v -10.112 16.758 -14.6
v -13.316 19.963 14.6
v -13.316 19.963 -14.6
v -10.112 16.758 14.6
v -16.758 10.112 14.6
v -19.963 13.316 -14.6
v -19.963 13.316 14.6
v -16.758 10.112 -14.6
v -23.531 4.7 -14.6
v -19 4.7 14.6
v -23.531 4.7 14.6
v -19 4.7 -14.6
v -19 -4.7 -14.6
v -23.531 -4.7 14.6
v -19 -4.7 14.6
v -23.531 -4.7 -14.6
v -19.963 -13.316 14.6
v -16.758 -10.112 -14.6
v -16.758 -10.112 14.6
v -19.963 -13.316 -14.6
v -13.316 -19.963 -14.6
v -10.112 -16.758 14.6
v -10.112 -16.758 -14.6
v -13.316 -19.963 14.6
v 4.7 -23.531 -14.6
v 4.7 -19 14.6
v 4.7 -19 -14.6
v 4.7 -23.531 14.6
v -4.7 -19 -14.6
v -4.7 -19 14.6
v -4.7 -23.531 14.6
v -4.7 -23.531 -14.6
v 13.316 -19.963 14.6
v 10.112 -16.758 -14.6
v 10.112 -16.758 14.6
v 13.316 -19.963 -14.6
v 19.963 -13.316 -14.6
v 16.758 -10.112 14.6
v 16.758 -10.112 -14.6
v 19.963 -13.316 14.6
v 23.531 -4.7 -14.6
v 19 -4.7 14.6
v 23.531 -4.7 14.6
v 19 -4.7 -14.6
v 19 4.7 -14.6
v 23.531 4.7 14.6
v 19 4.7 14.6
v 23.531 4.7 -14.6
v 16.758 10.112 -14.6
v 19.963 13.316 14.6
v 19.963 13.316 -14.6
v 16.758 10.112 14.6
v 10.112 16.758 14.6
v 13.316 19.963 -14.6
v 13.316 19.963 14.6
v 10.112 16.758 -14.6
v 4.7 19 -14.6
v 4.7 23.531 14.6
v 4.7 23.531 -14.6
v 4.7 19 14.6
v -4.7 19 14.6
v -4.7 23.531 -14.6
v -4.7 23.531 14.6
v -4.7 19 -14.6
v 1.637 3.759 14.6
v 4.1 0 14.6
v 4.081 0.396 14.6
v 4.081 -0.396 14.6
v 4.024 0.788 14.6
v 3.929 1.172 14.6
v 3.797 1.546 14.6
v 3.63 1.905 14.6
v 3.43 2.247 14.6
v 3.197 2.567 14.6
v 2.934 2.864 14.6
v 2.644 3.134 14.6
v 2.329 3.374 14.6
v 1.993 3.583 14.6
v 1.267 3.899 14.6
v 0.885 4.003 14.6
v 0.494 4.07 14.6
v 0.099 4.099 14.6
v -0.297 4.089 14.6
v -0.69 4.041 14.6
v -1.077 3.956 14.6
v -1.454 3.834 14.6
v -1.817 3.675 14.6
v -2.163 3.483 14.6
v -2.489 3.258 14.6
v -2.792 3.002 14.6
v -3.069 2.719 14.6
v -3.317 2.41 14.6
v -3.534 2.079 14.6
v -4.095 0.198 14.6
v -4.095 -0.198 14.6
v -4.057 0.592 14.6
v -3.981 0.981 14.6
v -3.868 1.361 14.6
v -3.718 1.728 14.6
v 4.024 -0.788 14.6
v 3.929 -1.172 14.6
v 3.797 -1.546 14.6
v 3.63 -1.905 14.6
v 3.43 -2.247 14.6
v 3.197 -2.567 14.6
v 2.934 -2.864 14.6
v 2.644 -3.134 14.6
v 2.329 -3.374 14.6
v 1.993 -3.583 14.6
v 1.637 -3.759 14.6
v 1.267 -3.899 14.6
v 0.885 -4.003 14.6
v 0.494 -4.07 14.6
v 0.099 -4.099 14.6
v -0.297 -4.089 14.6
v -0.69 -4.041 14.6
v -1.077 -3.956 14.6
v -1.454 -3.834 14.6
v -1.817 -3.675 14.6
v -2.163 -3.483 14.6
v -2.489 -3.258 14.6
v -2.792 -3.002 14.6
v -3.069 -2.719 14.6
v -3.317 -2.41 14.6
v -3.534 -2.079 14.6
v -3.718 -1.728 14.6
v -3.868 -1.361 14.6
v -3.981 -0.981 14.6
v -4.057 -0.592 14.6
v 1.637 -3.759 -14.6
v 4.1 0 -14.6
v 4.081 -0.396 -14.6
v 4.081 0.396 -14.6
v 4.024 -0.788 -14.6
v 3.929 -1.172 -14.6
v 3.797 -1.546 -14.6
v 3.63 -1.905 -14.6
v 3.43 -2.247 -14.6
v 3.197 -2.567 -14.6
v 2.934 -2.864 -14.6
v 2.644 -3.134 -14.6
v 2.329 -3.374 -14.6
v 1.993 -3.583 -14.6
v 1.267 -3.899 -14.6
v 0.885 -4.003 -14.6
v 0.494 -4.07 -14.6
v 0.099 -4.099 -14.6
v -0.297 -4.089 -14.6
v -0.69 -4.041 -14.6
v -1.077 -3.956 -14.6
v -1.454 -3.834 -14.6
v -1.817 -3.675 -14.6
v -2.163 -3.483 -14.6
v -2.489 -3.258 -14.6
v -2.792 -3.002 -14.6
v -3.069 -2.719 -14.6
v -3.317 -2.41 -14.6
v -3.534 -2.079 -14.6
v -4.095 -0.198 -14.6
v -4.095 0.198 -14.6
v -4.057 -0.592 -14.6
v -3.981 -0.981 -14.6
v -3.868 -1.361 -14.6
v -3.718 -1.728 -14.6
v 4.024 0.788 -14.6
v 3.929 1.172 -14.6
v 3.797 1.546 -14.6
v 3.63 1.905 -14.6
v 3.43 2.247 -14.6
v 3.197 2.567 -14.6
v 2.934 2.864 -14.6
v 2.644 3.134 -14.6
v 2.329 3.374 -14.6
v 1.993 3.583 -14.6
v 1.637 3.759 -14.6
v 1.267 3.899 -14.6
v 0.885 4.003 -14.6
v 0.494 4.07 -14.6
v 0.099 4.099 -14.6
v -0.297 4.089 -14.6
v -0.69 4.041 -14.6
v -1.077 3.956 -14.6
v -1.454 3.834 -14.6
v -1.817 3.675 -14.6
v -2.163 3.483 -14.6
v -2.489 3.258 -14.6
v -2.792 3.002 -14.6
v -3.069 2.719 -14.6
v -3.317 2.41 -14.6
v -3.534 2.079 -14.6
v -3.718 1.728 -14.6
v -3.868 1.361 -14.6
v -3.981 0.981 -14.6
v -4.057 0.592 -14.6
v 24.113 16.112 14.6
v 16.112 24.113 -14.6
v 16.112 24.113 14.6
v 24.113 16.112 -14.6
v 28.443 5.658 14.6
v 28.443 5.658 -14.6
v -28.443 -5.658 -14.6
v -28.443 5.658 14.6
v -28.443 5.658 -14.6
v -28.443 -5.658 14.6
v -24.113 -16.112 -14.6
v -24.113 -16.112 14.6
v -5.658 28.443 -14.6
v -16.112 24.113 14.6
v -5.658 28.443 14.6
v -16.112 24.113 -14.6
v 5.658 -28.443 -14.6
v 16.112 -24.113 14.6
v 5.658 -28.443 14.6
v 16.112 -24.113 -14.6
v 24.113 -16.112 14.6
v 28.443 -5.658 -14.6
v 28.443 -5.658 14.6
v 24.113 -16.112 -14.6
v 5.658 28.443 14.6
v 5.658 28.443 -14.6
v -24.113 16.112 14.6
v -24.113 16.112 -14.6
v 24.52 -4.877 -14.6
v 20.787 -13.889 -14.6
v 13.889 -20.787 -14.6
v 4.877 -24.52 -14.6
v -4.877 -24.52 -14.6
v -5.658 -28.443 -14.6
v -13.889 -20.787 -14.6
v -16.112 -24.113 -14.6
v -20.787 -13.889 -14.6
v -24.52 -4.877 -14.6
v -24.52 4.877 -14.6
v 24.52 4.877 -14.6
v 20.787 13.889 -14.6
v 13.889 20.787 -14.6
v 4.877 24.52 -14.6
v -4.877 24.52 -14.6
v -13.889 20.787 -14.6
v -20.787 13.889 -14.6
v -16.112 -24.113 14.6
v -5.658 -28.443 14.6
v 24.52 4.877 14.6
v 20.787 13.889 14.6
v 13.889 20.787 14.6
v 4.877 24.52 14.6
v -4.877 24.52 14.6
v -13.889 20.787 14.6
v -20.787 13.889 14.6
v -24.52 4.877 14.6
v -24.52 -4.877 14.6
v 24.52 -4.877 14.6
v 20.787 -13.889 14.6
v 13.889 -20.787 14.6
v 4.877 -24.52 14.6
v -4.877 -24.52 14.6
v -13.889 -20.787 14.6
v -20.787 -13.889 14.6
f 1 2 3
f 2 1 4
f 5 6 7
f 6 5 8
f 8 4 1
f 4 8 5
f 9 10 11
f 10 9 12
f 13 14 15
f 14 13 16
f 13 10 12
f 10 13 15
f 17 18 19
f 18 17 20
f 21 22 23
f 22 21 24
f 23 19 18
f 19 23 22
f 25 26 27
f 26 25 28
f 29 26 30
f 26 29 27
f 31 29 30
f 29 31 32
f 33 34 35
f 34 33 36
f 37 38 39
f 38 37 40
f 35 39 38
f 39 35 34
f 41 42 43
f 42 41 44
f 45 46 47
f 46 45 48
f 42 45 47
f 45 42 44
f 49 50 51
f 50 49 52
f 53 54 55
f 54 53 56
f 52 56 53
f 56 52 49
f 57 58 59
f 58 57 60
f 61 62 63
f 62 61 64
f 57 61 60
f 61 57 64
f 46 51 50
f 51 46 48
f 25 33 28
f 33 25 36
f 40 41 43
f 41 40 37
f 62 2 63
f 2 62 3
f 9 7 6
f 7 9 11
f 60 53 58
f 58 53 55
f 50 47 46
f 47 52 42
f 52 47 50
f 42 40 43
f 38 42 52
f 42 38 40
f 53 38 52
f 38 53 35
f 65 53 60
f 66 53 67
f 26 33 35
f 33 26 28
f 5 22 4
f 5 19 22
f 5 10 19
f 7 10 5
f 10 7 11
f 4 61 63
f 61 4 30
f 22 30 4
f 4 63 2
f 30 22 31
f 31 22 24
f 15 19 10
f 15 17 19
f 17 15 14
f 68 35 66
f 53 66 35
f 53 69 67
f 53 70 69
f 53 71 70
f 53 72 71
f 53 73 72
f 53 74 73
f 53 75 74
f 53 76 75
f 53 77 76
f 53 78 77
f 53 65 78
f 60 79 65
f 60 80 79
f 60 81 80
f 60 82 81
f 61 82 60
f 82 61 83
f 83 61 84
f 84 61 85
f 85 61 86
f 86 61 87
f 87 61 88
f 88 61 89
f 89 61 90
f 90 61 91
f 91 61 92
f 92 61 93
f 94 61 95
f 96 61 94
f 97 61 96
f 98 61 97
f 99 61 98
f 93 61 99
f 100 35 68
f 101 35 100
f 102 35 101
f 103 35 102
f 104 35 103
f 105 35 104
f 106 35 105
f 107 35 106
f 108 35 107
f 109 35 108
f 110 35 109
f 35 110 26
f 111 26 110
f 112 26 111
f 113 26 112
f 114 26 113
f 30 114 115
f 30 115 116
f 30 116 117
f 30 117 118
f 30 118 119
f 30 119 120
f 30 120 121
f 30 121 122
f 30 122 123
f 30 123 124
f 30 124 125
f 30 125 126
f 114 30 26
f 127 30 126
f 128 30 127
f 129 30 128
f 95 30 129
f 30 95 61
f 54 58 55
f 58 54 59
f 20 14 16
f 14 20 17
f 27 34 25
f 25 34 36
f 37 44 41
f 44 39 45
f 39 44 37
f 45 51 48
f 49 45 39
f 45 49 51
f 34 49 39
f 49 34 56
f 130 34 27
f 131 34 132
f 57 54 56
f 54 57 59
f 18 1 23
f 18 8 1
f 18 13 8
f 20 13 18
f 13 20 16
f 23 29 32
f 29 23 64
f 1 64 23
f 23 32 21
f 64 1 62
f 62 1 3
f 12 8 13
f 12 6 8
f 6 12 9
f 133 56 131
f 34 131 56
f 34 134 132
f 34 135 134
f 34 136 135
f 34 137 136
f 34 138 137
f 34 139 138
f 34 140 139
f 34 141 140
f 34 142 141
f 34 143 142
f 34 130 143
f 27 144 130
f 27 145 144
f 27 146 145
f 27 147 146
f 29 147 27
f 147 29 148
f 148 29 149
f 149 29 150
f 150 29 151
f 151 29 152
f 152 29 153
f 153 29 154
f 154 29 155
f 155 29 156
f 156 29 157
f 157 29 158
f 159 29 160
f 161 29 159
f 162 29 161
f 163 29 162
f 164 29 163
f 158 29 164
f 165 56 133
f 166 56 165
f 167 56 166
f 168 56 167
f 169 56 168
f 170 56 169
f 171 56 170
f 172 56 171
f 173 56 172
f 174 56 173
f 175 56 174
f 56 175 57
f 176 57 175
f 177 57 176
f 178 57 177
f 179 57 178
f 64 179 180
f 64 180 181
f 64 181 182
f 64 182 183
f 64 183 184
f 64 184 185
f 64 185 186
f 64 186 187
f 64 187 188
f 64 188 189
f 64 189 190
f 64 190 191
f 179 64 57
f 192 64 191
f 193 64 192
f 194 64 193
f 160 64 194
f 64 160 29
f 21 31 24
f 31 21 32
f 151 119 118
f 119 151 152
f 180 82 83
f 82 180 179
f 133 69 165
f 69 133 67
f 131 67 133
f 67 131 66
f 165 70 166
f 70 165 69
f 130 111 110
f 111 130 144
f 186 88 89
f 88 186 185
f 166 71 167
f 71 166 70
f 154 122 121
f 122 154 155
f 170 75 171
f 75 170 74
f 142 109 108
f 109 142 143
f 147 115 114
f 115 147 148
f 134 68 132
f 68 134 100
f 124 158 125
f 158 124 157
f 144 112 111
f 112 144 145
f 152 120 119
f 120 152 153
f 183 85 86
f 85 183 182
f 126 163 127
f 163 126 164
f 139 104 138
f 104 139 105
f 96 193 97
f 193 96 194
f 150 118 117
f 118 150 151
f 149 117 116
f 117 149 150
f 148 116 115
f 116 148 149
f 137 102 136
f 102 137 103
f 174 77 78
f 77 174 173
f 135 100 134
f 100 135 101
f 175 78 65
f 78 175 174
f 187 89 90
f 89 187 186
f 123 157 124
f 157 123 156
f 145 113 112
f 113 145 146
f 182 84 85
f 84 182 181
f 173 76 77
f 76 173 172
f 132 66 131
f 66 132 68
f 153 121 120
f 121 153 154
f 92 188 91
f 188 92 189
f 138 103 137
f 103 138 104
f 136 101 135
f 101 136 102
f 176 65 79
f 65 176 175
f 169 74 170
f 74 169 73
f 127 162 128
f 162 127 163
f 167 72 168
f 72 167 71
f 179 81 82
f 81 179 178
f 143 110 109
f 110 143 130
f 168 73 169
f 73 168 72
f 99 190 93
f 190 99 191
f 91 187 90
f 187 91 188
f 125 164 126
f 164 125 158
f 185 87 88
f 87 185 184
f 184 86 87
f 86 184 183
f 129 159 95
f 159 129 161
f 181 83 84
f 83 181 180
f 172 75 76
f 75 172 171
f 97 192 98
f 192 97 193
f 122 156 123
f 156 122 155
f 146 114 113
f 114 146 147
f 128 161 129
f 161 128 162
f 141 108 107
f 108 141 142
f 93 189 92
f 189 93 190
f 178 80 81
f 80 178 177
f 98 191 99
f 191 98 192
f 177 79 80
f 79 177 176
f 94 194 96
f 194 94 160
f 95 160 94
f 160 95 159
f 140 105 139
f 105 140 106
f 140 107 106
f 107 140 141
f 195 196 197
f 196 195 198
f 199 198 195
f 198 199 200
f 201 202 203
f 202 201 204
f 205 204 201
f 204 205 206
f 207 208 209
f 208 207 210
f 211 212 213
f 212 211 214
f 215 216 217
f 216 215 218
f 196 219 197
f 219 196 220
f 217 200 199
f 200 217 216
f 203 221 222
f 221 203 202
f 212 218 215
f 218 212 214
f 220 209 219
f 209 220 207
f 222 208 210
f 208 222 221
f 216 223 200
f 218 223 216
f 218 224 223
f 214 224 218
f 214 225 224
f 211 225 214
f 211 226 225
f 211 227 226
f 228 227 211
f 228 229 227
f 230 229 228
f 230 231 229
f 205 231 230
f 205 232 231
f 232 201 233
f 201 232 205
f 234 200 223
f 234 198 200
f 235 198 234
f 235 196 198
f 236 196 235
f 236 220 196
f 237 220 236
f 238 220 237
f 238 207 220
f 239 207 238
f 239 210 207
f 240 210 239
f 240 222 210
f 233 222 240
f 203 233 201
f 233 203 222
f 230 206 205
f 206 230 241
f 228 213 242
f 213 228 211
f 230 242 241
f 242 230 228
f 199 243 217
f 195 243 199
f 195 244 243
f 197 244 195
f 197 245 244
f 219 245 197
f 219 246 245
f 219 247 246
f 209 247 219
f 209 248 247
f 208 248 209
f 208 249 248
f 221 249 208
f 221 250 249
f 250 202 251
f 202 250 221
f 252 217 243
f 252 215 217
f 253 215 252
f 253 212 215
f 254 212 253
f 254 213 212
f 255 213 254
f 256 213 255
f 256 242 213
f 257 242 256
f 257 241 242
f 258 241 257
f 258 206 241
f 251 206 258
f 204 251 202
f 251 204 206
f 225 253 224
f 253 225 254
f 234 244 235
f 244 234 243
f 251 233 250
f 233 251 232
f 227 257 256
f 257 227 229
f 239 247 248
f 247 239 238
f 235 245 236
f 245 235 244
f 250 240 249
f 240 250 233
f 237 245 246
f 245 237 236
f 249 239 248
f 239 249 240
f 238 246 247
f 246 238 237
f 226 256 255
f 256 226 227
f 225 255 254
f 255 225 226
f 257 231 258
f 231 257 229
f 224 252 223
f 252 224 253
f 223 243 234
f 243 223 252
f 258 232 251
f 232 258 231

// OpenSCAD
include <MCAD/bearing.scad>

// ---------------------------
// Constants
// ---------------------------
$fa = 1;
$fs = 0.4;
in_to_mm = 25.4;
gap = 1.25; //1/32 * in_to_mm;
nut_gap = 7;//3/4 * in_to_mm;
eps = .15;

bearingModel = 608; //608
bearing_depth = bearingWidth(bearingModel);
bearing_or = bearingOuterDiameter(bearingModel)/2;
bearing_ir = bearingInnerDiameter(bearingModel)/2;
axel_ir = bearing_ir+.1;
alignment_bolt_r = 3.9/2;


// ---------------------------
// Variables
// ---------------------------
num_holes=8;
sectors = num_holes;
sector_degrees = 360 / sectors;

// Bar Magent values
bar_mag_length = 29.2;//29.2;
bar_mag_width = 9.4;//9.4;
bar_mag_depth = 5;//5;
border = 5;

// Coil related values
coil_wire_width = bar_mag_width;
coil_inner_r = 1;
coil_center_hole_r = bearing_or+eps;

// Calculated values
bar_mag_cir = num_holes*2*bar_mag_width;
//bar_mag_disk_r = round(bar_mag_cir/(3.14159*2)+bar_mag_length+border+2);
bar_mag_disk_r = round(bar_mag_cir/(3.14159*2));
bar_mag_disk_depth = bar_mag_depth;
coil_disk_depth = 4;
coil_disk_r = round(bar_mag_disk_r + coil_disk_depth + gap);
coil_disk_base = .6;

//Print values
echo(str("num_holes:", num_holes));
echo(str("bearing_depth:", bearing_depth));
echo(str("sector_degrees:", sector_degrees));
echo(str("bar_mag_disk_r:", bar_mag_disk_r));
echo(str("bar_mag_disk_depth:", bar_mag_disk_depth));
echo(str("coil_disk_r:", coil_disk_r));
echo(str("coil_disk_depth:", coil_disk_depth));

//#translate([0,0,6.6])barMagCoilHolderBottom();
//%translate([0,0,0])barMagCoilHolderInnerAnchorArray();

//cylinder(h=bar_mag_length,r=bar_mag_disk_r,center=true);//,$fn=num_holes*2);
//rotate([0,0,sector_degrees/4])
//barMagVertCyl(rounded=false);
rotate([0,0,0]) { //sector_degrees/4
    %barMagVertArray();
    barMagVertDisk(rounded=false);
}
coilVertDisk(rounded=false);

module coilVertDisk(h=bar_mag_length, r=coil_disk_r, rounded=true) {
    difference() {
        barMagVertCyl(h=h,r=r,rounded=rounded);
        barMagVertCyl(h=h+1,r=r-coil_disk_depth,rounded=rounded);
    }
}

module barMagVertDisk(rounded=true) {
    z=bar_mag_length+1;
    difference() {
        barMagVertCyl(rounded=rounded);
        barMagVertArray(y=bar_mag_depth,z=z);
        barMagVertCyl(h=z, r=axel_ir);
    }
}

module barMagVertCyl(h=bar_mag_length, r=bar_mag_disk_r, rounded=true) {
    if (rounded == true) {
        cylinder(h=h,r=r,center=true);
    } else {
        rotate([0,0,sector_degrees/4])
        cylinder(h=h,r=r,center=true, $fn=num_holes*2);
    }
}

module barMagVertArray(x=bar_mag_width, y=bar_mag_depth, z=bar_mag_length) {
    sectors = num_holes;
    sector_degrees = 360 / sectors;
    for(sector = [1 : sectors]) {
        angle = sector_degrees * sector;
        rotate([0,0,angle])barMagVert(x=x, y=y, z=z);
    }    
}

module barMagVert(x=bar_mag_width, y=bar_mag_depth, z=bar_mag_length) {
    //-.45
    translate([0,bar_mag_disk_r-(y/2),0])
    cube([x,y,z], center=true);
}

render_mode = "JOE"; //"FULL", "PRINT", "TEST";
print_mode = "MAG_DISK"; //"MAG_DISK","COIL_DISK","HOLDER_TOP","HOLDER_BOT";

// Main rendering code
if (render_mode=="FULL") {
    renderFull();
} else if (render_mode=="PRINT") {
    renderPrint();
} else if (render_mode=="TEST") {
    renderTest();
}

module renderFull() {
    // Coil Disk
    //#barMagCoilHolderArray();
    barMagCoilDisk(bearing=true);
    
    // Rotating Magnet Disks (animate use: fps=1, steps=12)
    z_offset = (bar_mag_disk_depth + bearing_depth)/2 +1;
    rotate([0,0,sector_degrees*$t]) {
        translate([0,0,z_offset])
        %barMagDisk();
        translate([0,0,-z_offset])
        %barMagDisk();
    }
}

module renderPrint() {
    if (print_mode=="MAG_DISK") {
        // Magnet Disk1
        barMagDisk();
    } else if (print_mode=="COIL_DISK") {
        // COIL Disk
        barMagCoilDisk();
    } else if (print_mode=="HOLDER_TOP") {
        // Wire coil holder top and cap
        // Only need one set of these for winding the coils
        barMagCoilHolderTop();
        rotate([0,0,90])barMagCoilHolderCap();
    } else if (print_mode=="HOLDER_BOT") {
        // Wire coil holder bottom
        barMagCoilHolderBottom();
    }
}

// ---------------------------------------
// Rotating Bar Magnet Disk Modules
// ---------------------------------------

// Bar Magnet Disk
module barMagDisk(h=bar_mag_depth) {
    difference() {
        cylinder(h=h,r=bar_mag_disk_r,center=true);
        //remove holes for bar magnets
        barMagHoles(bar_mag_disk_r, border);
        //remove hole for main axel
        cylinder(h=h*2,r=axel_ir,center=true);
    }
}

module barMagHoles(r,b,x=bar_mag_length,y=bar_mag_width,z=20) {
    sectors = num_holes;
    sector_degrees = 360 / sectors;
    for(sector = [1 : sectors]) {
        angle = sector_degrees * sector;
        rotate([0,0,angle])barMagHole(r,b,x,y,z);
    }    
}

module barMagHole(r,b,x=bar_mag_length,y=bar_mag_width,z=20) {
    translate([r-(x/2)-b,0,0])cube([x, y, z], center=true);
}

// ---------------------------------------
// Stationary Coil Disk Modules
// ---------------------------------------

// Stationary Bar Mag Coil Disk with trapezoid coils
module barMagCoilDisk(h=coil_disk_depth, bearing=false) {
    anchor_z = 2+coil_disk_base;
    anchor_offest_z = (h-anchor_z)/2;
    hole_or = bar_mag_disk_r + (coil_disk_r-bar_mag_disk_r)/1.5;
    // Disk
    difference() {
        //main structure
        cylinder(h=h,r=coil_disk_r,center=true);
        //remove trapezoids for coils
        translate([0,0,coil_disk_base])barMagCoilHolderOuterArray(z=h);
        //translate([0,0,coil_disk_base])barMagCoilHolderArray(z=h);
        // remove center hole for bearing
        cylinder(h=h*2,r=coil_center_hole_r,center=true);
        // remove outer alignment holes
        structureHoles(h=h,radius=hole_or,hole_r=alignment_bolt_r,sectors=num_holes*2);
        // remove wire channels
        wireChannels(h=h,radius=hole_or,hole_r=alignment_bolt_r,sectors=num_holes);
    }
    translate([0,0,-anchor_offest_z])barMagCoilHolderInnerAnchorArray(z=anchor_z);
    if (bearing == true) {
        translate([0, 0, -bearing_depth/2])
        bearing(model=bearingModel, outline=false);
    }
}


// ---------------------------------------
// Coil Holder Modules
// ---------------------------------------

module barMagCoilHolderCap(z=2) {
    difference() {
        barMagCoilHolderOuterHull(y=coil_wire_width,z=z);
        barMagCoilHolderCenterHoles();
    }
}

module barMagCoilHolderTop(z=2) {
    z_anch = 4;
    difference() {
        union() {
            barMagCoilHolderOuterHull(y=coil_wire_width,z=z);
            translate([0,0,z/2])rotate([0,0,180])barMagCoilHolderInnerAnchor(z=z_anch);
        }
        barMagCoilHolderCenterHoles();
    }
}

module barMagCoilHolderBottom(z=coil_disk_depth) {
    z_off1 = coil_disk_base;
    z_off2 = (z_off1+.0)*2;
    difference() {
        barMagCoilHolderOuterHull(y=coil_wire_width-.45,z=z);
        // remove space for wire
        translate([0,0,z_off1])barMagCoilHolderDiff(z=z);
        // chop off the top to make it the right overall depth
        translate([0,0,z/2])barMagCoilHolderOuterHull(y=coil_wire_width,z=z_off2);
        // remove bolt holes used for winding
        barMagCoilHolderCenterHoles();
        // remove wire start/finish holes
        barMagCoilHolderWireHoles();
        // remove anchor inset
        rotate([0,0,180])translate([0,0,z/2-z_off1])barMagCoilHolderInnerAnchor(z=5, scaleFactor=.81);
    }
}

module barMagCoilHolderCenterHoles(z=coil_disk_depth) {
    coil_center_r = coil_disk_r - border - coil_wire_width - bar_mag_length/1.5;
    coil_offset_r = coil_center_r + coil_wire_width;
    rotate([0,0,-sector_degrees/2]) {
        translate([0,coil_center_r,0])cylinder(h=z*2,r=alignment_bolt_r,center=true);
        translate([0,coil_offset_r,0])cylinder(h=z*2,r=1.5,center=true);
    }
}

module barMagCoilHolderWireHoles(z=coil_disk_depth) {
    x_off = coil_wire_width/8;
    coil_offset_r = coil_disk_r - border - coil_wire_width/1.25;
    translate([x_off,coil_offset_r,0])cylinder(h=z*2,r=1,center=true);
    rotate([0,0,-sector_degrees]) {
        translate([-x_off,coil_offset_r,0])cylinder(h=z*2,r=1,center=true);
    }
}

module barMagCoilHolderArray(z=10) {
    sectors = num_holes/2;
    sector_degrees = 360 / sectors;
    for(sector = [1 : sectors]) {
        angle = sector_degrees * sector;
        rotate([0,0,angle])barMagCoilHolderDiff(z=z);
    }    
}

module barMagCoilHolderDiff(z=10) {
    difference() {
        barMagCoilHolderOuterHull(z=z);
        barMagCoilHolderInnerHull(z=z+2);
    }
}

module barMagCoilHolderOuterArray(z=20) {
    sectors = num_holes/2;
    sector_degrees = 360 / sectors;
    for(sector = [1 : sectors]) {
        angle = sector_degrees * sector;
        //echo(str("angle_h:", angle));
        rotate([0,0,angle])barMagCoilHolderOuterHull(z=z);
    }    
}

module barMagCoilHolderOuterHull(y=coil_wire_width,z=10) {
    hull() {
        barMagCoilOutlines(r=bar_mag_disk_r,b=border,y=y,z=z);
    }
}
module barMagCoilOutlines(r,b,x=bar_mag_length,y=coil_wire_width,z=10) {
    sectors = num_holes;
    sector_degrees = 360 / sectors;
    for(sector = [1 : 0.25 : 2]) {
        angle = sector_degrees * sector;
        rotate([0,0,angle])barMagCoilOut(r,b,sector,x,y,z);
    }    
}

module barMagCoilOut(r,b,sector,x=bar_mag_length,y=coil_wire_width,z=10) {
    x_off = x/2 + y/2 + coil_inner_r;
    x_off2 = x_off/1.25;
    y_off = y/4;
    translate([r-(x/2)-b,0,0]){
        if (sector == 1) {
            translate([x_off,y_off,0])cylinder(h=z,r=y/2,center=true);
            translate([x_off2,0,0])cylinder(h=z,r=y/2,center=true);
            translate([-x_off2,0,0])cylinder(h=z,r=y/2,center=true);
            translate([-x_off,y_off,0])cylinder(h=z,r=y/2,center=true);
        } else if (sector == 2) {
            translate([x_off,-y_off,0])cylinder(h=z,r=y/2,center=true);
            translate([x_off2,0,0])cylinder(h=z,r=y/2,center=true);
            translate([-x_off2,0,0])cylinder(h=z,r=y/2,center=true);
            translate([-x_off,-y_off,0])cylinder(h=z,r=y/2,center=true);
        } else {
            translate([x_off,-y_off,0])cylinder(h=z,r=y/2,center=true);
        }
    }
}

module barMagCoilHolderInnerAnchorArray(z=2, scaleFactor=0.8) {
    sectors = num_holes/2;
    sector_degrees = 360 / sectors;
    for(sector = [1 : sectors]) {
        angle = (sector_degrees * sector)-(180-sector_degrees);// + (sector_degrees * 1.2); //For 10
        //echo(str("angle_a:", angle));
        rotate([0,0,angle])barMagCoilHolderInnerAnchor(z=z,scaleFactor=scaleFactor);
    }    
}

module barMagCoilHolderInnerAnchor(z=4, scaleFactor=0.8) {
    y_off = bar_mag_disk_r-(bar_mag_length/2)-border;
    angle = 90 + (sector_degrees * 1.5); //-sector_degrees/2
    rotate([0,0,angle])
    translate([0,y_off,0])
    scale([scaleFactor,scaleFactor,1])barMagCoilHolderInnerHullCenter(z=z);
}

//translate([-16,-39,0])barMagCoilHolderInnerHull(z=5);
module barMagCoilHolderInnerHullCenter(z=20) {
    angle = 90 - (sector_degrees * 1.5);
    y_off = bar_mag_disk_r-(bar_mag_length/2)-border;
    translate([0,-y_off,0])
    rotate([0,0,angle])
    barMagCoilHolderInnerHull(z=z);
}

module barMagCoilHolderInnerHull(z=20) {
    hull() {
        barMagCoilInlines(bar_mag_disk_r,border,z=z);
    }
}

module barMagCoilInlines(r,b,x=bar_mag_length,y=coil_wire_width,z=20) {
    sectors = num_holes;
    sector_degrees = 360/sectors;
    for(sector = [1 : 0.5 : 2]) {
        angle = sector_degrees * sector;
        rotate([0,0,angle])barMagCoilIn(r,b,sector,x,y,z);
    }    
}

module barMagCoilIn(r,b,sector,x=bar_mag_length,y=coil_wire_width,z=20) {
    x_off = x/2;
    y_off = y/2 + coil_inner_r;
    translate([r-(x/2)-b,0,0]){
        if (sector == 1) {
            translate([x_off,y_off,0])cylinder(h=z,r=coil_inner_r,center=true);
            translate([0,y_off,0])cube([x, coil_inner_r*2, z], center=true);
            translate([-x_off,y_off,0])cylinder(h=z,r=coil_inner_r,center=true);
        } else if (sector == 2) {
            translate([x_off,-y_off,0])cylinder(h=z,r=coil_inner_r,center=true);
            translate([0,-y_off,0])cube([x, coil_inner_r*2, z], center=true);
            translate([-x_off,-y_off,0])cylinder(h=z,r=coil_inner_r,center=true);
        } else {
            translate([x_off,y_off,0])cylinder(h=z,r=coil_inner_r,center=true);
            translate([x_off,-y_off,0])cylinder(h=z,r=coil_inner_r,center=true);
        }
    }
}


// ---------------------------------------
// Common Modules
// ---------------------------------------

module wireChannels(h, radius, hole_r, sectors=num_holes) {
    sector_degrees = 360 / sectors;
    for(sector = [1 : 1 : sectors]) {
        angle = sector_degrees * sector;
        rotate([0,0,angle]){
            translate([0,radius,0])cube([hole_r,border*4,hole_r], center=true);
        }
    }    
}

module structureHoles(h, radius, hole_r, sectors=num_holes) {
    sector_degrees = 360 / sectors;
    for(sector = [1 : 1 : sectors]) {
        angle = sector_degrees * sector;
        x_pos = radius * sin(angle);
        y_pos = radius * cos(angle);
        translate([x_pos,y_pos,0]){
            hole(h, hole_r);
        }
    }    
}

module hole(h, hole_r) {
    cylinder(h=h+2,r=hole_r,center=true);
}


// ---------------------------------------
// Test Print Module
// ---------------------------------------

module renderTest(x=bar_mag_width,y=bar_mag_length,z=bar_mag_disk_depth) {
    difference() {
        //Base
        cube([x+border,y+border,z], center=true);
        //Bar Magnet hole
        cube([x, y, z+2], center=true);
    }
}
